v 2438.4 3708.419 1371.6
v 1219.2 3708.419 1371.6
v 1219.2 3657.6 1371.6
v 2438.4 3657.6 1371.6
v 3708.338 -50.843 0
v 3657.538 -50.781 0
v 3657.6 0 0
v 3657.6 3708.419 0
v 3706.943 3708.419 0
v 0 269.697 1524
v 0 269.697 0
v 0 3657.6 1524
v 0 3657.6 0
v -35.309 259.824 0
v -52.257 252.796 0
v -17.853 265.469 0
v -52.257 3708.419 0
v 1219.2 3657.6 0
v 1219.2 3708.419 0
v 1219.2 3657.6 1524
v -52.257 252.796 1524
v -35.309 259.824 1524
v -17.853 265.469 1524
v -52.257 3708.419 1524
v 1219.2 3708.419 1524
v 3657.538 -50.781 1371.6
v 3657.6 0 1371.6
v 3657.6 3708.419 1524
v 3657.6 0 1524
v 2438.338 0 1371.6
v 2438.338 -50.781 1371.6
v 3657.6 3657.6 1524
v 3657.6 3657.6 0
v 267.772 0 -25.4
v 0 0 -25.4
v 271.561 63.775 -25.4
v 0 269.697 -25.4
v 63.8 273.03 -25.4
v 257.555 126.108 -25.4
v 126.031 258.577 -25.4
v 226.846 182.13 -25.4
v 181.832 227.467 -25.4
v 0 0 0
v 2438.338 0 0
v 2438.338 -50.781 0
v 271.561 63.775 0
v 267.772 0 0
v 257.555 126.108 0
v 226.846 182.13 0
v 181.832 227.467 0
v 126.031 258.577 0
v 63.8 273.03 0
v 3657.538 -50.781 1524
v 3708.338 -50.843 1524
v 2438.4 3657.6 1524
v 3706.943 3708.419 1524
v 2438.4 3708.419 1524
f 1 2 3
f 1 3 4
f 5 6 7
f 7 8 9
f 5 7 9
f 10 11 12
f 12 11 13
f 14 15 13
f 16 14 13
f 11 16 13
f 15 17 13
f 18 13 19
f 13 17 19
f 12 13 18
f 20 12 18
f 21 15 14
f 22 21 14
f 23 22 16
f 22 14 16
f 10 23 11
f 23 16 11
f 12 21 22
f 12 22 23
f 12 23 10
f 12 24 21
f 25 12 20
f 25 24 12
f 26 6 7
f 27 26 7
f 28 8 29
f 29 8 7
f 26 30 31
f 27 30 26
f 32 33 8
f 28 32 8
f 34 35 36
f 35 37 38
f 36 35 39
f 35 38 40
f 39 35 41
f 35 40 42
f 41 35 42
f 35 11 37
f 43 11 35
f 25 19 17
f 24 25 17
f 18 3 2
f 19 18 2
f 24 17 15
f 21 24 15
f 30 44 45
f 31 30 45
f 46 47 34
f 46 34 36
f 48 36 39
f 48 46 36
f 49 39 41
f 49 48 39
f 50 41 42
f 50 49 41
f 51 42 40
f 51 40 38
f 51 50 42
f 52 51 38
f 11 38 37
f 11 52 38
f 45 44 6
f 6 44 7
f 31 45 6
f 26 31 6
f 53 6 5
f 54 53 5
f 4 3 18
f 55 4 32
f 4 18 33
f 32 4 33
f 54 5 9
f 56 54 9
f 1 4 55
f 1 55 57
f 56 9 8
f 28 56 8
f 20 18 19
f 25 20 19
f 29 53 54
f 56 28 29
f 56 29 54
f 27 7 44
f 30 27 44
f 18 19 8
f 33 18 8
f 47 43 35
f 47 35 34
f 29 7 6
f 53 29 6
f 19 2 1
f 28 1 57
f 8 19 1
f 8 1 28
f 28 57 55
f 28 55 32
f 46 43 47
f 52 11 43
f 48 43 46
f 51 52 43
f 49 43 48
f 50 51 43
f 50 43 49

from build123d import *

# Parameters (mm, degrees)
F1_DEPTH = 1371.6
F0_W     = 1219.2
F0_H     = 50.8188946724
F2_DEPTH = 1371.6
F3_DEPTH = 1524
F4_DEPTH = 1524
F5_DEPTH = 1524
F6_DEPTH = 25.4


# Not quite as in the source:
# - ends of sketch curves that miss each other by under 0.0002 mm in the source are joined


with BuildPart() as f1:
    # F0 (on Top) → F1 (new body)
    with BuildSketch(Plane.XY):
        Polygon((3657.6, 0), (2438.3381043434, 0), (2438.3381043434, -50.7811053276), (3657.5381043434, -50.7811053276), align=None)
    extrude(amount=F1_DEPTH)


with BuildPart() as f2:
    # F0 (on Top) → F2 (new body)
    with BuildSketch(Plane.XY):
        with Locations((1828.8, 3683.0094473362)):
            Rectangle(F0_W, F0_H)
    extrude(amount=F2_DEPTH)

    # F0 (on Top) → F3 (join)
    with BuildSketch(Plane.XY):
        with Locations((3048, 3683.0094473362)):
            Rectangle(F0_W, F0_H)
    extrude(amount=F3_DEPTH)


with BuildPart() as f4:
    # F0 (on Top) → F4 (new body)
    with BuildSketch(Plane.XY):
        with BuildLine():
            ThreePointArc((-52.2567629814, 252.7961764093), (-26.6377838889, 262.8216290531), (0, 269.6969661319))
            Line((0, 269.6969661319), (0, 3657.6))
            Line((0, 3657.6), (1219.2, 3657.6))
            Line((1219.2, 3657.6), (1219.2, 3708.4188946724))
            Line((1219.2, 3708.4188946724), (-52.2567629814, 3708.4188946724))
            Line((-52.2567629814, 3708.4188946724), (-52.2567629814, 252.7961764093))
        make_face()
    extrude(amount=F4_DEPTH)


with BuildPart() as f5:
    # F0 (on Top) → F5 (new body)
    with BuildSketch(Plane.XY):
        Polygon((3657.6, 0.0188946724), (3657.6, 0), (3657.5381043434, -50.7811053276), (3708.3380666361, -50.8430009382), (3706.9432370186, 3708.4188946724), (3657.6, 3708.4188946724), (3657.6, 3657.6), align=None)
    extrude(amount=F5_DEPTH)


with BuildPart() as f6:
    # F0 (on Top) → F6 (new body)
    with BuildSketch(Plane.XY):
        with BuildLine():
            Line((0, 269.6969661319), (0, 0))
            Line((0, 0), (267.7718077733, 0))
            ThreePointArc((267.7718077733, 0), (271.1711559173, 22.5439223267), (272.3080413103, 45.3143306077))
            ThreePointArc((272.3080413103, 45.3143306077), (189.0804970171, 221.7365772824), (0, 269.6969661319))
        make_face()
    extrude(amount=-F6_DEPTH)


solid = Compound([f1.part, f2.part, f4.part, f5.part, f6.part])
